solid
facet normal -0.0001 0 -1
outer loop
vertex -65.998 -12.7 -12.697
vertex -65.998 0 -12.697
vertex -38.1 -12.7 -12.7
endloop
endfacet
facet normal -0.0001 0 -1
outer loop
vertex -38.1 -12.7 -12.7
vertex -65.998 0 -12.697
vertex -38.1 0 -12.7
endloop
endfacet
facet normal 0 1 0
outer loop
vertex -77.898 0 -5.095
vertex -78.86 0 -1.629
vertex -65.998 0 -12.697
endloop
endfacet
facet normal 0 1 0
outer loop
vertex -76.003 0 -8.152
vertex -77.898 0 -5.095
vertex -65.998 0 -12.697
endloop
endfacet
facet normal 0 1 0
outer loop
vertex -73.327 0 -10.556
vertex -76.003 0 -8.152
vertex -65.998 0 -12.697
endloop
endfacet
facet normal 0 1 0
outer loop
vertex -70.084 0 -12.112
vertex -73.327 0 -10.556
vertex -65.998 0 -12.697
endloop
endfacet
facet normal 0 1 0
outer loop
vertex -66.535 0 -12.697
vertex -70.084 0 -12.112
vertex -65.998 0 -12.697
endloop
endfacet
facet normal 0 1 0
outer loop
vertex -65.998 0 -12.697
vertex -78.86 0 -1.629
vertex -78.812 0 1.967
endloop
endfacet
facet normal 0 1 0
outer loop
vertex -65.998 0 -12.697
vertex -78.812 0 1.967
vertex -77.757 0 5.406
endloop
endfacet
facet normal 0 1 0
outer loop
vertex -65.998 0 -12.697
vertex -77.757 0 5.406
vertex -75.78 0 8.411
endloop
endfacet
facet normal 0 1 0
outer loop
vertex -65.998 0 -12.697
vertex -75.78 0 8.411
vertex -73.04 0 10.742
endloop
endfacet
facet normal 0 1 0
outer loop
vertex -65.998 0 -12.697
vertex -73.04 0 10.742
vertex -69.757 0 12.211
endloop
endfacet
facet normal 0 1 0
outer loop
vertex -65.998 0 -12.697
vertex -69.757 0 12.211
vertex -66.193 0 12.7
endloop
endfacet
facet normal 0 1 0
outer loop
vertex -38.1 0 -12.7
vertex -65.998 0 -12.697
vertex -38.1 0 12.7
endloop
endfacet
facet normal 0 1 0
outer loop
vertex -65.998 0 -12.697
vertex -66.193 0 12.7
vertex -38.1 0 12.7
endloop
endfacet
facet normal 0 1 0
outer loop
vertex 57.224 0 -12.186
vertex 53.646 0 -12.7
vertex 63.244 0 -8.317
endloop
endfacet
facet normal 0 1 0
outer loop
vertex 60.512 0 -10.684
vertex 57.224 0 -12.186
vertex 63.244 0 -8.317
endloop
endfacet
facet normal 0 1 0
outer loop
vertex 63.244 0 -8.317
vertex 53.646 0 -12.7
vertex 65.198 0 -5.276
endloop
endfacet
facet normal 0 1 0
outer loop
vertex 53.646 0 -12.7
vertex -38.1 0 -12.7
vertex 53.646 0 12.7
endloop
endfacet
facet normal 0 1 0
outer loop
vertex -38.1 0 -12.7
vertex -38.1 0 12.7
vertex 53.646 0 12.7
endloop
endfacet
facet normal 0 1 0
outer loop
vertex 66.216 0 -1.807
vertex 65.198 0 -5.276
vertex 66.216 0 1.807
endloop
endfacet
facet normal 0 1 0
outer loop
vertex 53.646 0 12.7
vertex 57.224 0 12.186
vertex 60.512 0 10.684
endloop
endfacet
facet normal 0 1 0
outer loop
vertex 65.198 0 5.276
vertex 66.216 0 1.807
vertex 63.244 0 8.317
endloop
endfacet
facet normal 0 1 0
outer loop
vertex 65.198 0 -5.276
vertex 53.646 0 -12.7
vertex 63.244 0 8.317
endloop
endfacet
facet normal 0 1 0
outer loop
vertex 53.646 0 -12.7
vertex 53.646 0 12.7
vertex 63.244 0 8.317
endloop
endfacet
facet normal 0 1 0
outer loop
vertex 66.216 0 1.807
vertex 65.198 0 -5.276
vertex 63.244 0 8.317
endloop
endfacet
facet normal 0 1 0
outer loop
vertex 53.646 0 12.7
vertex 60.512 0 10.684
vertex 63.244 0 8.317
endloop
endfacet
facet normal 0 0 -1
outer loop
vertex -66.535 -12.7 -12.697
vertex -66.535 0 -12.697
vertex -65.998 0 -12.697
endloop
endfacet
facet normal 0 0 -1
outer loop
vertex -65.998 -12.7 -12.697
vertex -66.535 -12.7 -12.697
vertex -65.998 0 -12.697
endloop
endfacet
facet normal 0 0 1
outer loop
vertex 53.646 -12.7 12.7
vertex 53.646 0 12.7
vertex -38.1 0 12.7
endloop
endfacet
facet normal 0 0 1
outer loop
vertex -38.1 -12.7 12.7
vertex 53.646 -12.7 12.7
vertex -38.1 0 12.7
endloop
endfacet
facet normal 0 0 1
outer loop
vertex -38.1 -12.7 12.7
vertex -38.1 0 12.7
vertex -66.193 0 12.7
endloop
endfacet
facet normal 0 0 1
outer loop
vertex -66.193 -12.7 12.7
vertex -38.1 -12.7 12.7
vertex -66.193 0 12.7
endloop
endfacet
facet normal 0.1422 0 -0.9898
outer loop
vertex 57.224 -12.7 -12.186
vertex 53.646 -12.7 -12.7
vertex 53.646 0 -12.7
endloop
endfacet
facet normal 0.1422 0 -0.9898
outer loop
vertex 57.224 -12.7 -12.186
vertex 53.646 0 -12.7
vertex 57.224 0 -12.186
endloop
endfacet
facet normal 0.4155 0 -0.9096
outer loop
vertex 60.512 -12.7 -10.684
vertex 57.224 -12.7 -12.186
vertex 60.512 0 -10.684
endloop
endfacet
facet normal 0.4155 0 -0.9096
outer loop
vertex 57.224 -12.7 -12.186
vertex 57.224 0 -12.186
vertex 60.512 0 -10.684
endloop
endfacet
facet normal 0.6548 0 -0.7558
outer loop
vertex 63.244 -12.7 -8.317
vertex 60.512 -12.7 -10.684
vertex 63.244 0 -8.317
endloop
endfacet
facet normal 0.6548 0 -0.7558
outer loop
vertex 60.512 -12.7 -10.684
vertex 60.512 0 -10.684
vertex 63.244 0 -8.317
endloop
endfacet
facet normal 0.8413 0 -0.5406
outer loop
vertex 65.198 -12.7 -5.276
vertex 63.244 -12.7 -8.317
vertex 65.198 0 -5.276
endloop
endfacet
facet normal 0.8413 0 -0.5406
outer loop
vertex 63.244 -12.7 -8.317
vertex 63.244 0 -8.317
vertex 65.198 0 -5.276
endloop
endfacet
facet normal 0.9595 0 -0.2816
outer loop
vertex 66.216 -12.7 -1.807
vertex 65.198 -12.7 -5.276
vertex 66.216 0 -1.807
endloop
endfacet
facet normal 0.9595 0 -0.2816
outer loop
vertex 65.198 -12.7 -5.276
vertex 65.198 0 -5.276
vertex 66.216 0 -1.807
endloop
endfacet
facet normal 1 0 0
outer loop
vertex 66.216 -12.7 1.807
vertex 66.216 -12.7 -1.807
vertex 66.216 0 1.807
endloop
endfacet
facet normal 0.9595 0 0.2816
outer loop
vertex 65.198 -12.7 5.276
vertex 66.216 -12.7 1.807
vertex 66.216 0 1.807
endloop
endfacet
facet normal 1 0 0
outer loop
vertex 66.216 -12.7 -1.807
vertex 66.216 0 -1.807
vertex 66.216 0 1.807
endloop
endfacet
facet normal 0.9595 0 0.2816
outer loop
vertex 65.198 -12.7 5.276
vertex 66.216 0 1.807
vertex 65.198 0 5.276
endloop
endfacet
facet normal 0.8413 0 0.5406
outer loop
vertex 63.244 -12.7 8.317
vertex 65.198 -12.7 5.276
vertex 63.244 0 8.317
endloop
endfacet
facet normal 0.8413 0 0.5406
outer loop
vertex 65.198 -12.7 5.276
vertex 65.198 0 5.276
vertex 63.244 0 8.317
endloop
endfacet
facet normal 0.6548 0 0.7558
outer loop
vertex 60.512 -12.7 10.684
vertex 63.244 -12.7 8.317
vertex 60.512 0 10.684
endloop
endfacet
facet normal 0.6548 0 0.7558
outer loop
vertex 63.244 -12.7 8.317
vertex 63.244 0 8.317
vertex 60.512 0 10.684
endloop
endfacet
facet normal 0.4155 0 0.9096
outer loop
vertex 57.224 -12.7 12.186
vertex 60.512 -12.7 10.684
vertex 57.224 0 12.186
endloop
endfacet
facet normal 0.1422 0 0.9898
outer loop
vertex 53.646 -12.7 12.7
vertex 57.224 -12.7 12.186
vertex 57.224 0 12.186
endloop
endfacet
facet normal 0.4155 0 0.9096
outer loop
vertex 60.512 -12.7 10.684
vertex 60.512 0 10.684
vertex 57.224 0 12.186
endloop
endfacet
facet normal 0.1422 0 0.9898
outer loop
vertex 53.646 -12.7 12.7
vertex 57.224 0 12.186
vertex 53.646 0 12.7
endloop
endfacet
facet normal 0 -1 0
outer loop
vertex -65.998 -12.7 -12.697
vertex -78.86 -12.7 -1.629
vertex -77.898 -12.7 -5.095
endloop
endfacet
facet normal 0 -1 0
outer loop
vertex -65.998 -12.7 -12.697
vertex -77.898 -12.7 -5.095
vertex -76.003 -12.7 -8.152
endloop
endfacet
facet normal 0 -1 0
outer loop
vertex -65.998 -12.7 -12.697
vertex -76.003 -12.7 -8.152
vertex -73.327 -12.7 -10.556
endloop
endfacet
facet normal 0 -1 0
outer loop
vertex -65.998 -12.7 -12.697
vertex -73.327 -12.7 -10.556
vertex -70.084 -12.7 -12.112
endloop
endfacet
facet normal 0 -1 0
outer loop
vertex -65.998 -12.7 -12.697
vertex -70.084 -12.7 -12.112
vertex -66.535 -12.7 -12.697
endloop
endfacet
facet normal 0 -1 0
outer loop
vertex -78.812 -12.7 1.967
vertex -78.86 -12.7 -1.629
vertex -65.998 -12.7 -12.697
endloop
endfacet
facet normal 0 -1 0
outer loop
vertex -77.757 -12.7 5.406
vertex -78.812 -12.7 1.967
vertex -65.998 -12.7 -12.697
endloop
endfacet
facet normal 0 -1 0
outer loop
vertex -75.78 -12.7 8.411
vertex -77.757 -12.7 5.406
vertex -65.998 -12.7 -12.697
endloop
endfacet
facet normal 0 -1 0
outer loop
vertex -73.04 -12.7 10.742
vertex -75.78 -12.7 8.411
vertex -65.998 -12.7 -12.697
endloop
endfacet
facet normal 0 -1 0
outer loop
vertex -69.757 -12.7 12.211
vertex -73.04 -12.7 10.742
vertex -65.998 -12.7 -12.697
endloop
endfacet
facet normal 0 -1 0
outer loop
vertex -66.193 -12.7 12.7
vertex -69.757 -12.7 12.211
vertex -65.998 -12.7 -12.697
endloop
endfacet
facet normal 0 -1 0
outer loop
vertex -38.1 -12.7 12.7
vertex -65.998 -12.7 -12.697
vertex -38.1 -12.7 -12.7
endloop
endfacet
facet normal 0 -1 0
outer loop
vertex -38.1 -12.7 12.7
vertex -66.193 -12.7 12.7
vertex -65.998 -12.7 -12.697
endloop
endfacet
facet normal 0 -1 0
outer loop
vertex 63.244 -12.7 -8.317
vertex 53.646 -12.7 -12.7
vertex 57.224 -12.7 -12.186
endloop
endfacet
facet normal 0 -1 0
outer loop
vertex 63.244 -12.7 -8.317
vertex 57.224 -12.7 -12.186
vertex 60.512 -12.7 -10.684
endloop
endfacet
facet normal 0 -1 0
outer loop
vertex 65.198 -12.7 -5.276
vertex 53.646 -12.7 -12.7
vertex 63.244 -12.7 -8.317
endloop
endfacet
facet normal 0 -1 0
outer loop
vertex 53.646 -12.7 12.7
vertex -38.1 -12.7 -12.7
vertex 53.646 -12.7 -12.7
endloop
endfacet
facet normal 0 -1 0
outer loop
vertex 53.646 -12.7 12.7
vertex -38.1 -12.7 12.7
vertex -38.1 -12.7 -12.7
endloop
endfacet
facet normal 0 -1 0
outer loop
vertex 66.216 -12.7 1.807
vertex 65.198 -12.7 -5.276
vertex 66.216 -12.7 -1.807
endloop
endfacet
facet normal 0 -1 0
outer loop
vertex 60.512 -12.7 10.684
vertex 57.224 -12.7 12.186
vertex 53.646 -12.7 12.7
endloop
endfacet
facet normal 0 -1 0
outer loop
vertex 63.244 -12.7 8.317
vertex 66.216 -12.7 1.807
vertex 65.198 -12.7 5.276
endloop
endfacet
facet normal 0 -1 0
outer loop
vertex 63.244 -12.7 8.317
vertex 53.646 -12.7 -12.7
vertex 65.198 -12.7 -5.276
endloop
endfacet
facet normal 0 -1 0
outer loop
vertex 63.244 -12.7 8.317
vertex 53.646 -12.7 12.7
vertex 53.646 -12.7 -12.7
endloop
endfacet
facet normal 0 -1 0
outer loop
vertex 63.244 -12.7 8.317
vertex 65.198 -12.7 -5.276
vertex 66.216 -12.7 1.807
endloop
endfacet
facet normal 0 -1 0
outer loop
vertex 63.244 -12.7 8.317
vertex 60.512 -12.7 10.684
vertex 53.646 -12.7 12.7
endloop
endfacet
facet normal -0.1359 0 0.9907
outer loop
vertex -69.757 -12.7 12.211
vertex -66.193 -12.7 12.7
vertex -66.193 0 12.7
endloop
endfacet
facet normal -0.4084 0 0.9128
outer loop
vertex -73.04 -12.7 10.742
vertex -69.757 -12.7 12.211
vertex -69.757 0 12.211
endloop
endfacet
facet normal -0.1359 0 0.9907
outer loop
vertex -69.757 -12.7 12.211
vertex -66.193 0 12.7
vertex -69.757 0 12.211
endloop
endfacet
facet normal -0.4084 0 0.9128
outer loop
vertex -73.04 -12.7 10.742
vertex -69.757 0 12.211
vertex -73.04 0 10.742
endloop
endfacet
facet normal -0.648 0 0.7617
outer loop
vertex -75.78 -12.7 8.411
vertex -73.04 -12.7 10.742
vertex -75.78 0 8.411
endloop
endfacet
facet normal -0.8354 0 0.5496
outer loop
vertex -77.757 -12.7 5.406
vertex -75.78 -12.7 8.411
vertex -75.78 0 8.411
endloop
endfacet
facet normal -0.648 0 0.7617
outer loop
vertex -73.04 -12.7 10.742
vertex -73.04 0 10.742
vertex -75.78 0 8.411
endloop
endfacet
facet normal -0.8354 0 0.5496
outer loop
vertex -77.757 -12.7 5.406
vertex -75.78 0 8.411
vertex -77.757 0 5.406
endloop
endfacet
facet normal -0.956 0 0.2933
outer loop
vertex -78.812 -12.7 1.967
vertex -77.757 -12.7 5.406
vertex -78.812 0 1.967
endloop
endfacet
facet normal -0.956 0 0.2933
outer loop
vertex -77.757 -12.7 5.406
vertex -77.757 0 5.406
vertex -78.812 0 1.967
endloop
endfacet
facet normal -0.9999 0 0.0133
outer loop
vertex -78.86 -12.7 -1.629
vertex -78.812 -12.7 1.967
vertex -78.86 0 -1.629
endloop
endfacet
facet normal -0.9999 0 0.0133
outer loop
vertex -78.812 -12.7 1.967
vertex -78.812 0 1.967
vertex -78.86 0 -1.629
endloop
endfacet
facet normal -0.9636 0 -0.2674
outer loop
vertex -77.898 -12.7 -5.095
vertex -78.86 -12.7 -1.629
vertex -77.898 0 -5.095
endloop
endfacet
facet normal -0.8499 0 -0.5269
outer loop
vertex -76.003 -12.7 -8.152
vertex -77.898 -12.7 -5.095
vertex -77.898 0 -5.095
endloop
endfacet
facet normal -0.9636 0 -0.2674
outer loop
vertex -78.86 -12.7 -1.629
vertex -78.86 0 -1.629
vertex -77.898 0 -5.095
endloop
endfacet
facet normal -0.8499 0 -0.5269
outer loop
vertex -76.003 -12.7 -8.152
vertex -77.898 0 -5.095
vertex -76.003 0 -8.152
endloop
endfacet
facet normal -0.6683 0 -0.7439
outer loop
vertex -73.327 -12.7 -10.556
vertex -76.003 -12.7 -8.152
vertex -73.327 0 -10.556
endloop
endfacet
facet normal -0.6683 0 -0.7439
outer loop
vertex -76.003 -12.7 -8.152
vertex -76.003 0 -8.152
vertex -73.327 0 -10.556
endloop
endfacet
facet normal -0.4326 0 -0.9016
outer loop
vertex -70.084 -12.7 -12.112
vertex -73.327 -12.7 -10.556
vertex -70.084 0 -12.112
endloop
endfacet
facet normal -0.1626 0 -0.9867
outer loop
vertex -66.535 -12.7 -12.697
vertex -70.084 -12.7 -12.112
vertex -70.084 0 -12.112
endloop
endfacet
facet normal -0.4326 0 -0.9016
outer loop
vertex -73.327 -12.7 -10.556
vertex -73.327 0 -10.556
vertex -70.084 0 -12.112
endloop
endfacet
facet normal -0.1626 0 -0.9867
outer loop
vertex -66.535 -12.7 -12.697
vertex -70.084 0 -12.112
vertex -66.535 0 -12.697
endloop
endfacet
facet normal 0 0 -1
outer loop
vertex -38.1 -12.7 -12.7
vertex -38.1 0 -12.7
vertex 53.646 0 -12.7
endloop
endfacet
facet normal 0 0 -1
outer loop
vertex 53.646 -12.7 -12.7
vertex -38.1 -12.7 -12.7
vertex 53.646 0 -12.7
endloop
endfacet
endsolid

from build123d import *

# Parameters (mm, degrees)
F1_DEPTH = 12.7


# Not quite as in the source:
# - ends of sketch curves that miss each other by under 0.0002 mm in the source are joined


with BuildPart() as f1:
    # F0 (on Front) → F1 (new body)
    with BuildSketch(Plane.XZ):
        with BuildLine():
            Line((-19.0339237452, 12.7), (-38.1, 12.7))
            Line((-38.1, 12.7), (-66.1931892949, 12.6997966278))
            ThreePointArc((-66.1931892949, 12.6997966278), (-78.963911742, 0.170887308), (-66.5349535226, -12.6971318925))
            Line((-66.5349535226, -12.6971318925), (-65.9977308849, -12.6971860797))
            Line((-65.9977308849, -12.6971860797), (-38.1, -12.7))
            Line((-38.1, -12.7), (38.1, -12.7))
            Line((38.1, -12.7), (53.6455512047, -12.7))
            ThreePointArc((53.6455512047, -12.7), (66.3455512047, 0), (53.6455512047, 12.7))
            Line((53.6455512047, 12.7), (38.1, 12.7))
            Line((38.1, 12.7), (-19.0339237452, 12.7))
        make_face()
    extrude(amount=F1_DEPTH)


solid = f1.part
